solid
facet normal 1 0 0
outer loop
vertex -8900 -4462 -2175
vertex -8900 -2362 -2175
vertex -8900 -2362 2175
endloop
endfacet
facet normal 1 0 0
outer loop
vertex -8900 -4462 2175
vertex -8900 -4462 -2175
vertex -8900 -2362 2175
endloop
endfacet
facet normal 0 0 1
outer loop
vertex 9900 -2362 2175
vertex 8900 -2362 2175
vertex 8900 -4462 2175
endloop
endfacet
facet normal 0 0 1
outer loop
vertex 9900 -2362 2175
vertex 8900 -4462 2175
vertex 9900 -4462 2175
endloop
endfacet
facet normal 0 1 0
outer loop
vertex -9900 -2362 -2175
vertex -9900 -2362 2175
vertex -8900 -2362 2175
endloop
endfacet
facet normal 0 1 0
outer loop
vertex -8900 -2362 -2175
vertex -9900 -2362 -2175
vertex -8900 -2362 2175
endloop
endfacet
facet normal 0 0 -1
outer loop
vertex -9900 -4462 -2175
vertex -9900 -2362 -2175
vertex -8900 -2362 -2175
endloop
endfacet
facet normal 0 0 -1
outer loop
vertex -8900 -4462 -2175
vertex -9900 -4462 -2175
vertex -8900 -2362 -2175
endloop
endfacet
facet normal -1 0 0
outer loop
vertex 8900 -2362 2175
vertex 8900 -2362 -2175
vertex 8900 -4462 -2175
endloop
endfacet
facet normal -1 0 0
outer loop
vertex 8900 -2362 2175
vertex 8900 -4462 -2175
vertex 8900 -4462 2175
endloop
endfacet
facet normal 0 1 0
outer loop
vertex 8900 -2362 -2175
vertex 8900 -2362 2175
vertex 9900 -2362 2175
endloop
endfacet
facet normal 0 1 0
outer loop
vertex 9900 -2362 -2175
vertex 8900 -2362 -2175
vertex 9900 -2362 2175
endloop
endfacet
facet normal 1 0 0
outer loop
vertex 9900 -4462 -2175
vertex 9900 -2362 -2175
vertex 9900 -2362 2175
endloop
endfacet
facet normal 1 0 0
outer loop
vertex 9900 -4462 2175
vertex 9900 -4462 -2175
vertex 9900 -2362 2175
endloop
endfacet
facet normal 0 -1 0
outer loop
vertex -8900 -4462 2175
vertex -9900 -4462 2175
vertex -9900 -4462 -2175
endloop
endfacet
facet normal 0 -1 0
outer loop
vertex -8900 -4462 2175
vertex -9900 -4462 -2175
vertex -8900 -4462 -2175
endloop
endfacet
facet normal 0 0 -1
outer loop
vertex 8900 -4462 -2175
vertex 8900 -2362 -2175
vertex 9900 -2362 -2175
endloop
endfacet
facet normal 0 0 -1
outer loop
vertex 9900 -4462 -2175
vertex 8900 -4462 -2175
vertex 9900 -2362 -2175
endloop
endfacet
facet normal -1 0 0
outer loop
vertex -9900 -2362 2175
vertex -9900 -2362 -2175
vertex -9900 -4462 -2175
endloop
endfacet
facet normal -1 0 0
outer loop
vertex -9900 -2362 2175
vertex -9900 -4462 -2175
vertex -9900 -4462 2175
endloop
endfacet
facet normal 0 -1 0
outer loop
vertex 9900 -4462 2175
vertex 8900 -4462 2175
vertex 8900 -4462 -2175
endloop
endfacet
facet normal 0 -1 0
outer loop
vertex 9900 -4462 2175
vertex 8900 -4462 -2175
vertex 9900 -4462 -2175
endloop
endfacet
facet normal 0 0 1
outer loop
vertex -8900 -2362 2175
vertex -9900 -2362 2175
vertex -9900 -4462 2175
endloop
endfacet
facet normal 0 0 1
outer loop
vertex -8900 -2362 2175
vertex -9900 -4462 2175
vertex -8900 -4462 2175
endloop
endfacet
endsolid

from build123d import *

# Parameters (mm, degrees)
SKETCH1_W        = 1000
SKETCH1_H        = 4350
EXTRUDE1_DEPTH   = 2100
EXTRUDE1_2_DEPTH = 2100


with BuildPart() as part:
    # Sketch1 → Extrude1 (new body)
    with BuildSketch(Plane.XZ.offset(2362)):
        with Locations((9400, 0)):
            Rectangle(SKETCH1_W, SKETCH1_H)
    extrude(amount=EXTRUDE1_DEPTH)


with BuildPart() as body_2:
    # Sketch1 → Extrude1 2 (new body)
    with BuildSketch(Plane.XZ.offset(2362)):
        with Locations((-9400, 0)):
            Rectangle(SKETCH1_W, SKETCH1_H)
    extrude(amount=EXTRUDE1_2_DEPTH)


solid = Compound([part.part, body_2.part])
